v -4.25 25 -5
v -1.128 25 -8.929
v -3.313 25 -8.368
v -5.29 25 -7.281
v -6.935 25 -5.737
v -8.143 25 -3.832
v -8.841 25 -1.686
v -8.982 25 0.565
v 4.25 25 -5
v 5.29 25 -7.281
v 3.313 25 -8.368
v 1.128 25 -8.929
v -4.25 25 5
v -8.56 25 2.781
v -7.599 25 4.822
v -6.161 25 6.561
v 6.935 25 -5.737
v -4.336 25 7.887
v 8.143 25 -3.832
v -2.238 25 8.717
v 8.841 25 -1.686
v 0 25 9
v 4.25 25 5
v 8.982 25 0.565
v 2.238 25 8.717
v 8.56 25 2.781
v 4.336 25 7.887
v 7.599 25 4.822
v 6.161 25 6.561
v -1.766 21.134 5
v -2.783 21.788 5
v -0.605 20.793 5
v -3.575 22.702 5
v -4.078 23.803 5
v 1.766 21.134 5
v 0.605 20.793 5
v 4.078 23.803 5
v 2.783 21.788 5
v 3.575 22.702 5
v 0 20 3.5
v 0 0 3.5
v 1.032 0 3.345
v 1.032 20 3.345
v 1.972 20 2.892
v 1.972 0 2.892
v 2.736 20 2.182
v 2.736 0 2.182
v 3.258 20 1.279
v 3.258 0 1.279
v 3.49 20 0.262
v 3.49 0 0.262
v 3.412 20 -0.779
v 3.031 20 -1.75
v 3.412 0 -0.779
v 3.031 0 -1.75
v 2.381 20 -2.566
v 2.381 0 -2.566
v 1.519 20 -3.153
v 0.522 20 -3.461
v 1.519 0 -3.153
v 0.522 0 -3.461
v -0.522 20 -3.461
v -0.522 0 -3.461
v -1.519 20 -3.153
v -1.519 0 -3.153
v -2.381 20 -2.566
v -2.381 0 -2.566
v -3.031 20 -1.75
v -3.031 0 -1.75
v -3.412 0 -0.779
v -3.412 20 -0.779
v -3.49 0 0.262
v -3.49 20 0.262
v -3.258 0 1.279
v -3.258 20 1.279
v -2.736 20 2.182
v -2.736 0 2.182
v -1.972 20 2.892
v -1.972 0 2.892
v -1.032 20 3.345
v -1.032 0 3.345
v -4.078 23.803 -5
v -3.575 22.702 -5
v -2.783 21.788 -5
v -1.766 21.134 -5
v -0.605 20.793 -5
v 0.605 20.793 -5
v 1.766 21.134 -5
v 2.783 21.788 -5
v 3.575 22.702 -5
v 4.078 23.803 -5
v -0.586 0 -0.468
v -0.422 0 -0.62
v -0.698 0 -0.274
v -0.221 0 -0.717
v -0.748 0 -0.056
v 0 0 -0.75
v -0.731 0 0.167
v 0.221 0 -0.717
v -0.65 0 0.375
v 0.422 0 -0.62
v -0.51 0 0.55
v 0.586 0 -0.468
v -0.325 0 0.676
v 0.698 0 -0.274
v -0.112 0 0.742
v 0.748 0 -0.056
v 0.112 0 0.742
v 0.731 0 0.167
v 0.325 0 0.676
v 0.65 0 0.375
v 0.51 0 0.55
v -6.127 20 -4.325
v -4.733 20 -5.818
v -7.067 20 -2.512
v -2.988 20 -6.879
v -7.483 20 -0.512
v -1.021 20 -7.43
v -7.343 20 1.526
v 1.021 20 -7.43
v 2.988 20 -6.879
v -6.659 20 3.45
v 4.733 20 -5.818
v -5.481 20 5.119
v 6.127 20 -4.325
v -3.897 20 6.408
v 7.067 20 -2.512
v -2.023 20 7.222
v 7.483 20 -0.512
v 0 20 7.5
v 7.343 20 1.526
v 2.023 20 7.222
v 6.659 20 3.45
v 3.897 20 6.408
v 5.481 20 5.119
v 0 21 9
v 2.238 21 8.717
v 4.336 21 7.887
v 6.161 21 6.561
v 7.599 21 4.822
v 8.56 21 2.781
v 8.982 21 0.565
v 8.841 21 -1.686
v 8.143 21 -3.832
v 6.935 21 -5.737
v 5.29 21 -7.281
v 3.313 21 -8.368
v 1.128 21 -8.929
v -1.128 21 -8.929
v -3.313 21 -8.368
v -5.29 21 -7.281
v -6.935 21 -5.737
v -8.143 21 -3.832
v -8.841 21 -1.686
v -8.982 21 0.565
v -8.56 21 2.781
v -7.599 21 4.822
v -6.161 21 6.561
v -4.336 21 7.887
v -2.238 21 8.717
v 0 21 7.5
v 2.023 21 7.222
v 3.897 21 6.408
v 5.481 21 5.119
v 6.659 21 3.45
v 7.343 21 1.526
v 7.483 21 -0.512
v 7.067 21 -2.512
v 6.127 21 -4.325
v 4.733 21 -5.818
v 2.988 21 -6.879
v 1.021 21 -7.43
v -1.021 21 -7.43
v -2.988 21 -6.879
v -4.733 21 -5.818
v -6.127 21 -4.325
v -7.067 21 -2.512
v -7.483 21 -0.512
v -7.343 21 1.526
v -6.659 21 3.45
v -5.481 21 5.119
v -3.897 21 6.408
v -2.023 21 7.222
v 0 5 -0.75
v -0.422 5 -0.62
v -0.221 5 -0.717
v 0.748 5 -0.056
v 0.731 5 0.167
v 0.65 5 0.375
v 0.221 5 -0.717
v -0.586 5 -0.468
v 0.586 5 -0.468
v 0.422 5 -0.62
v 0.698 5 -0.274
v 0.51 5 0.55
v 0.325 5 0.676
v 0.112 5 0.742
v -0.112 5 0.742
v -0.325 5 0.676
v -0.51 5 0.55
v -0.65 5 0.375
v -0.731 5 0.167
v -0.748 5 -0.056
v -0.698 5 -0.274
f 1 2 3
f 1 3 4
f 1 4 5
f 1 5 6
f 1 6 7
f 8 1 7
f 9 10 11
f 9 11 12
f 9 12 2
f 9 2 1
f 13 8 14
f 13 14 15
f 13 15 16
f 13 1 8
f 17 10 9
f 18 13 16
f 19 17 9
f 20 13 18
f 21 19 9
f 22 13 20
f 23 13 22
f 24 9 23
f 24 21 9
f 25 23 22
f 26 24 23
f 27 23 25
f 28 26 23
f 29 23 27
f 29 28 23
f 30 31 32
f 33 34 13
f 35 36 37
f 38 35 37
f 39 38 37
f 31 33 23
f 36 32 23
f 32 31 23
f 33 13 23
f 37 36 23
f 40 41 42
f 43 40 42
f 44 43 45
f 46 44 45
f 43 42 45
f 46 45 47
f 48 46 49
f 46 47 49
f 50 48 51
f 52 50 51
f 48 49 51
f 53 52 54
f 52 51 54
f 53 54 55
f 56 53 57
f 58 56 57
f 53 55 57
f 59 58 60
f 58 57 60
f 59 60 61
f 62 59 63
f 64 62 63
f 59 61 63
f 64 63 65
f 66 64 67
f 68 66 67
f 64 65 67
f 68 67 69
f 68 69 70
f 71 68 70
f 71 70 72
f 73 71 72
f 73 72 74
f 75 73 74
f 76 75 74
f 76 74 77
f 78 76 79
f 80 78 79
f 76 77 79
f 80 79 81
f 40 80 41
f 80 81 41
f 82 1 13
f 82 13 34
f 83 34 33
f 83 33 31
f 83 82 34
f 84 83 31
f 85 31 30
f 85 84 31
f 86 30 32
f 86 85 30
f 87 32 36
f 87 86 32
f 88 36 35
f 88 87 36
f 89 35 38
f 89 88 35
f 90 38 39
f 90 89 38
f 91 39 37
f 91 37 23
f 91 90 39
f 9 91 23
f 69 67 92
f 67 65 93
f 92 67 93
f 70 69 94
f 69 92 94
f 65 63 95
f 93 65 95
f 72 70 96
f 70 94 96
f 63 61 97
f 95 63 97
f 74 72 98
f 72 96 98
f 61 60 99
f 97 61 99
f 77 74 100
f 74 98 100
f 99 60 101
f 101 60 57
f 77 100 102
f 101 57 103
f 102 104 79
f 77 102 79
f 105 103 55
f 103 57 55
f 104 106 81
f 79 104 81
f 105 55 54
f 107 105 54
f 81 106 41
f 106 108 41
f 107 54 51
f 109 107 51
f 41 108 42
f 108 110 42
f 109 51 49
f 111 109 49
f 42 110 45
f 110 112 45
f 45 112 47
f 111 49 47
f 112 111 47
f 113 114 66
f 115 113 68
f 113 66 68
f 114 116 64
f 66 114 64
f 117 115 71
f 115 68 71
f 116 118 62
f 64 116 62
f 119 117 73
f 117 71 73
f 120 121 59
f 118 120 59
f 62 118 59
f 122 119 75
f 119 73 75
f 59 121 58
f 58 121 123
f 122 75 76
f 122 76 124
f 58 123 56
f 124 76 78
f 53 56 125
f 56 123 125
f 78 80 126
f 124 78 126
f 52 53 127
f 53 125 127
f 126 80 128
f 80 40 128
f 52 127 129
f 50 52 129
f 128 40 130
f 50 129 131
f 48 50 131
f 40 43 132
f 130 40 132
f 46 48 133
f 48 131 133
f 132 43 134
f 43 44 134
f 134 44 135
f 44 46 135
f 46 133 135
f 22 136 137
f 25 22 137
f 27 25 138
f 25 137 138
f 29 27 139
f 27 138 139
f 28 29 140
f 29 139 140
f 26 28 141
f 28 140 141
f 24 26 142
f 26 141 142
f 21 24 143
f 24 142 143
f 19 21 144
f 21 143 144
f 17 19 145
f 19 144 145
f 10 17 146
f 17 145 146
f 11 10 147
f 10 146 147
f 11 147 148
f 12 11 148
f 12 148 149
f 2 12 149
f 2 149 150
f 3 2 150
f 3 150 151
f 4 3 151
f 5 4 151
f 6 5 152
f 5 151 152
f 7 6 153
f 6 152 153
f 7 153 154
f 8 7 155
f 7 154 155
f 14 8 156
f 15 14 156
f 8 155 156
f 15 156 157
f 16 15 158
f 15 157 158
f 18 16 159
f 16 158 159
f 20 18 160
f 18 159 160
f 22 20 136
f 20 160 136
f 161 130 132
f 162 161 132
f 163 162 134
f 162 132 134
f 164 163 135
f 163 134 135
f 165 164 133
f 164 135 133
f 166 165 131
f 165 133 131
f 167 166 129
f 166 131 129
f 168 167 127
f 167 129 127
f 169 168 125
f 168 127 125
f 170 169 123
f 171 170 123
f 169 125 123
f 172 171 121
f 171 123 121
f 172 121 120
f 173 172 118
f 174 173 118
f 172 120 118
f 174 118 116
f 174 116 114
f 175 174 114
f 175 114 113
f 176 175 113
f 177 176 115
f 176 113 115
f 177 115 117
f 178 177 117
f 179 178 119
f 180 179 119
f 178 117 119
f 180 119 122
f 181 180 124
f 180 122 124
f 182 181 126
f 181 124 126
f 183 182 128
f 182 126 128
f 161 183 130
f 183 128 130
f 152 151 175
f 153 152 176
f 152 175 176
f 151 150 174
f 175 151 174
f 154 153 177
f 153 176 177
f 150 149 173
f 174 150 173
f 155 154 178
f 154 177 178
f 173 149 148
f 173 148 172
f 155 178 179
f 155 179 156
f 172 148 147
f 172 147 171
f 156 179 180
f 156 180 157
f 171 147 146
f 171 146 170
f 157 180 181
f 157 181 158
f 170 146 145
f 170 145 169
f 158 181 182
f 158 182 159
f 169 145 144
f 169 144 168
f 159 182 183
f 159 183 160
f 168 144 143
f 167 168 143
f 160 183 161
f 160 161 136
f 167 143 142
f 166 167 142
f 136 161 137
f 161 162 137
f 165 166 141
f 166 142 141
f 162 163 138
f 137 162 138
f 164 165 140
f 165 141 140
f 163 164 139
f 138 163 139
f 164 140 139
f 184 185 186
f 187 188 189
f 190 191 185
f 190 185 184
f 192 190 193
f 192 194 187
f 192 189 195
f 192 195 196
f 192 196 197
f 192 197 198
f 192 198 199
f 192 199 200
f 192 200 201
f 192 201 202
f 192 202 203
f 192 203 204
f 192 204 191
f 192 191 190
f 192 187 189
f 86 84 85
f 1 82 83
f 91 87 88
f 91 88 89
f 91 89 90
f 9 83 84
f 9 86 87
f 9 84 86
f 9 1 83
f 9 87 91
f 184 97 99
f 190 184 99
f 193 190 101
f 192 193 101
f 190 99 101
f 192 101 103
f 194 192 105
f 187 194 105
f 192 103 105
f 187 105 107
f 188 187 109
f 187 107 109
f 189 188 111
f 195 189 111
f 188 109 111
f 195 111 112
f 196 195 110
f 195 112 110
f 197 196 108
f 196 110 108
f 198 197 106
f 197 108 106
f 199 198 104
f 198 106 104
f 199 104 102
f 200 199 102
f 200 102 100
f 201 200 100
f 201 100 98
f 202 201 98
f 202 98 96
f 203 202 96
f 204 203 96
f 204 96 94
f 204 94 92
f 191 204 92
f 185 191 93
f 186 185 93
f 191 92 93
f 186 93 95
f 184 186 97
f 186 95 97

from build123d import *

# Parameters (mm, degrees)
CROQUIS2_R                 = 3.5
SALIENTE_EXTRUIR1_DEPTH    = 20
CROQUIS3_R                 = 7.5
SALIENTE_EXTRUIR2_DEPTH    = 1
CROQUIS5_R                 = 9
SALIENTE_EXTRUIR3_DEPTH    = 4
CORTAR_EXTRUIR1_DEPTH      = 5
CORTAR_EXTRUIR1_DEPTH_BACK = 5
CROQUIS6_R                 = 4.25
CROQUIS7_R                 = 0.75
CORTAR_EXTRUIR2_DEPTH      = 5


with BuildPart() as part:
    # Croquis2 → Saliente-Extruir1 (new body)
    with BuildSketch(Plane(origin=(0, 0, 0), x_dir=(1, 0, 0), z_dir=(0, 1, 0))):
        Circle(CROQUIS2_R)
    extrude(amount=SALIENTE_EXTRUIR1_DEPTH)

    # Croquis3 → Saliente-Extruir2 (add)
    with BuildSketch(Plane(origin=(0, 20, 0), x_dir=(1, 0, 0), z_dir=(0, 1, 0))):
        Circle(CROQUIS3_R)
    extrude(amount=SALIENTE_EXTRUIR2_DEPTH)

    # Croquis5 → Saliente-Extruir3 (add)
    with BuildSketch(Plane(origin=(0, 21, 0), x_dir=(1, 0, 0), z_dir=(0, 1, 0))):
        Circle(CROQUIS5_R)
    extrude(amount=SALIENTE_EXTRUIR3_DEPTH)

    # Croquis6 → Cortar-Extruir1 (cut, two sides: drawn at the far end of the back side and taken through both)
    with BuildSketch(Plane.XY.offset(-CORTAR_EXTRUIR1_DEPTH_BACK)):
        with Locations((0, 25)):
            Circle(CROQUIS6_R)
    extrude(amount=CORTAR_EXTRUIR1_DEPTH + CORTAR_EXTRUIR1_DEPTH_BACK, mode=Mode.SUBTRACT)

    # Croquis7 → Cortar-Extruir2 (cut)
    with BuildSketch(Plane.XZ):
        Circle(CROQUIS7_R)
    extrude(amount=-CORTAR_EXTRUIR2_DEPTH, mode=Mode.SUBTRACT)


solid = part.part
